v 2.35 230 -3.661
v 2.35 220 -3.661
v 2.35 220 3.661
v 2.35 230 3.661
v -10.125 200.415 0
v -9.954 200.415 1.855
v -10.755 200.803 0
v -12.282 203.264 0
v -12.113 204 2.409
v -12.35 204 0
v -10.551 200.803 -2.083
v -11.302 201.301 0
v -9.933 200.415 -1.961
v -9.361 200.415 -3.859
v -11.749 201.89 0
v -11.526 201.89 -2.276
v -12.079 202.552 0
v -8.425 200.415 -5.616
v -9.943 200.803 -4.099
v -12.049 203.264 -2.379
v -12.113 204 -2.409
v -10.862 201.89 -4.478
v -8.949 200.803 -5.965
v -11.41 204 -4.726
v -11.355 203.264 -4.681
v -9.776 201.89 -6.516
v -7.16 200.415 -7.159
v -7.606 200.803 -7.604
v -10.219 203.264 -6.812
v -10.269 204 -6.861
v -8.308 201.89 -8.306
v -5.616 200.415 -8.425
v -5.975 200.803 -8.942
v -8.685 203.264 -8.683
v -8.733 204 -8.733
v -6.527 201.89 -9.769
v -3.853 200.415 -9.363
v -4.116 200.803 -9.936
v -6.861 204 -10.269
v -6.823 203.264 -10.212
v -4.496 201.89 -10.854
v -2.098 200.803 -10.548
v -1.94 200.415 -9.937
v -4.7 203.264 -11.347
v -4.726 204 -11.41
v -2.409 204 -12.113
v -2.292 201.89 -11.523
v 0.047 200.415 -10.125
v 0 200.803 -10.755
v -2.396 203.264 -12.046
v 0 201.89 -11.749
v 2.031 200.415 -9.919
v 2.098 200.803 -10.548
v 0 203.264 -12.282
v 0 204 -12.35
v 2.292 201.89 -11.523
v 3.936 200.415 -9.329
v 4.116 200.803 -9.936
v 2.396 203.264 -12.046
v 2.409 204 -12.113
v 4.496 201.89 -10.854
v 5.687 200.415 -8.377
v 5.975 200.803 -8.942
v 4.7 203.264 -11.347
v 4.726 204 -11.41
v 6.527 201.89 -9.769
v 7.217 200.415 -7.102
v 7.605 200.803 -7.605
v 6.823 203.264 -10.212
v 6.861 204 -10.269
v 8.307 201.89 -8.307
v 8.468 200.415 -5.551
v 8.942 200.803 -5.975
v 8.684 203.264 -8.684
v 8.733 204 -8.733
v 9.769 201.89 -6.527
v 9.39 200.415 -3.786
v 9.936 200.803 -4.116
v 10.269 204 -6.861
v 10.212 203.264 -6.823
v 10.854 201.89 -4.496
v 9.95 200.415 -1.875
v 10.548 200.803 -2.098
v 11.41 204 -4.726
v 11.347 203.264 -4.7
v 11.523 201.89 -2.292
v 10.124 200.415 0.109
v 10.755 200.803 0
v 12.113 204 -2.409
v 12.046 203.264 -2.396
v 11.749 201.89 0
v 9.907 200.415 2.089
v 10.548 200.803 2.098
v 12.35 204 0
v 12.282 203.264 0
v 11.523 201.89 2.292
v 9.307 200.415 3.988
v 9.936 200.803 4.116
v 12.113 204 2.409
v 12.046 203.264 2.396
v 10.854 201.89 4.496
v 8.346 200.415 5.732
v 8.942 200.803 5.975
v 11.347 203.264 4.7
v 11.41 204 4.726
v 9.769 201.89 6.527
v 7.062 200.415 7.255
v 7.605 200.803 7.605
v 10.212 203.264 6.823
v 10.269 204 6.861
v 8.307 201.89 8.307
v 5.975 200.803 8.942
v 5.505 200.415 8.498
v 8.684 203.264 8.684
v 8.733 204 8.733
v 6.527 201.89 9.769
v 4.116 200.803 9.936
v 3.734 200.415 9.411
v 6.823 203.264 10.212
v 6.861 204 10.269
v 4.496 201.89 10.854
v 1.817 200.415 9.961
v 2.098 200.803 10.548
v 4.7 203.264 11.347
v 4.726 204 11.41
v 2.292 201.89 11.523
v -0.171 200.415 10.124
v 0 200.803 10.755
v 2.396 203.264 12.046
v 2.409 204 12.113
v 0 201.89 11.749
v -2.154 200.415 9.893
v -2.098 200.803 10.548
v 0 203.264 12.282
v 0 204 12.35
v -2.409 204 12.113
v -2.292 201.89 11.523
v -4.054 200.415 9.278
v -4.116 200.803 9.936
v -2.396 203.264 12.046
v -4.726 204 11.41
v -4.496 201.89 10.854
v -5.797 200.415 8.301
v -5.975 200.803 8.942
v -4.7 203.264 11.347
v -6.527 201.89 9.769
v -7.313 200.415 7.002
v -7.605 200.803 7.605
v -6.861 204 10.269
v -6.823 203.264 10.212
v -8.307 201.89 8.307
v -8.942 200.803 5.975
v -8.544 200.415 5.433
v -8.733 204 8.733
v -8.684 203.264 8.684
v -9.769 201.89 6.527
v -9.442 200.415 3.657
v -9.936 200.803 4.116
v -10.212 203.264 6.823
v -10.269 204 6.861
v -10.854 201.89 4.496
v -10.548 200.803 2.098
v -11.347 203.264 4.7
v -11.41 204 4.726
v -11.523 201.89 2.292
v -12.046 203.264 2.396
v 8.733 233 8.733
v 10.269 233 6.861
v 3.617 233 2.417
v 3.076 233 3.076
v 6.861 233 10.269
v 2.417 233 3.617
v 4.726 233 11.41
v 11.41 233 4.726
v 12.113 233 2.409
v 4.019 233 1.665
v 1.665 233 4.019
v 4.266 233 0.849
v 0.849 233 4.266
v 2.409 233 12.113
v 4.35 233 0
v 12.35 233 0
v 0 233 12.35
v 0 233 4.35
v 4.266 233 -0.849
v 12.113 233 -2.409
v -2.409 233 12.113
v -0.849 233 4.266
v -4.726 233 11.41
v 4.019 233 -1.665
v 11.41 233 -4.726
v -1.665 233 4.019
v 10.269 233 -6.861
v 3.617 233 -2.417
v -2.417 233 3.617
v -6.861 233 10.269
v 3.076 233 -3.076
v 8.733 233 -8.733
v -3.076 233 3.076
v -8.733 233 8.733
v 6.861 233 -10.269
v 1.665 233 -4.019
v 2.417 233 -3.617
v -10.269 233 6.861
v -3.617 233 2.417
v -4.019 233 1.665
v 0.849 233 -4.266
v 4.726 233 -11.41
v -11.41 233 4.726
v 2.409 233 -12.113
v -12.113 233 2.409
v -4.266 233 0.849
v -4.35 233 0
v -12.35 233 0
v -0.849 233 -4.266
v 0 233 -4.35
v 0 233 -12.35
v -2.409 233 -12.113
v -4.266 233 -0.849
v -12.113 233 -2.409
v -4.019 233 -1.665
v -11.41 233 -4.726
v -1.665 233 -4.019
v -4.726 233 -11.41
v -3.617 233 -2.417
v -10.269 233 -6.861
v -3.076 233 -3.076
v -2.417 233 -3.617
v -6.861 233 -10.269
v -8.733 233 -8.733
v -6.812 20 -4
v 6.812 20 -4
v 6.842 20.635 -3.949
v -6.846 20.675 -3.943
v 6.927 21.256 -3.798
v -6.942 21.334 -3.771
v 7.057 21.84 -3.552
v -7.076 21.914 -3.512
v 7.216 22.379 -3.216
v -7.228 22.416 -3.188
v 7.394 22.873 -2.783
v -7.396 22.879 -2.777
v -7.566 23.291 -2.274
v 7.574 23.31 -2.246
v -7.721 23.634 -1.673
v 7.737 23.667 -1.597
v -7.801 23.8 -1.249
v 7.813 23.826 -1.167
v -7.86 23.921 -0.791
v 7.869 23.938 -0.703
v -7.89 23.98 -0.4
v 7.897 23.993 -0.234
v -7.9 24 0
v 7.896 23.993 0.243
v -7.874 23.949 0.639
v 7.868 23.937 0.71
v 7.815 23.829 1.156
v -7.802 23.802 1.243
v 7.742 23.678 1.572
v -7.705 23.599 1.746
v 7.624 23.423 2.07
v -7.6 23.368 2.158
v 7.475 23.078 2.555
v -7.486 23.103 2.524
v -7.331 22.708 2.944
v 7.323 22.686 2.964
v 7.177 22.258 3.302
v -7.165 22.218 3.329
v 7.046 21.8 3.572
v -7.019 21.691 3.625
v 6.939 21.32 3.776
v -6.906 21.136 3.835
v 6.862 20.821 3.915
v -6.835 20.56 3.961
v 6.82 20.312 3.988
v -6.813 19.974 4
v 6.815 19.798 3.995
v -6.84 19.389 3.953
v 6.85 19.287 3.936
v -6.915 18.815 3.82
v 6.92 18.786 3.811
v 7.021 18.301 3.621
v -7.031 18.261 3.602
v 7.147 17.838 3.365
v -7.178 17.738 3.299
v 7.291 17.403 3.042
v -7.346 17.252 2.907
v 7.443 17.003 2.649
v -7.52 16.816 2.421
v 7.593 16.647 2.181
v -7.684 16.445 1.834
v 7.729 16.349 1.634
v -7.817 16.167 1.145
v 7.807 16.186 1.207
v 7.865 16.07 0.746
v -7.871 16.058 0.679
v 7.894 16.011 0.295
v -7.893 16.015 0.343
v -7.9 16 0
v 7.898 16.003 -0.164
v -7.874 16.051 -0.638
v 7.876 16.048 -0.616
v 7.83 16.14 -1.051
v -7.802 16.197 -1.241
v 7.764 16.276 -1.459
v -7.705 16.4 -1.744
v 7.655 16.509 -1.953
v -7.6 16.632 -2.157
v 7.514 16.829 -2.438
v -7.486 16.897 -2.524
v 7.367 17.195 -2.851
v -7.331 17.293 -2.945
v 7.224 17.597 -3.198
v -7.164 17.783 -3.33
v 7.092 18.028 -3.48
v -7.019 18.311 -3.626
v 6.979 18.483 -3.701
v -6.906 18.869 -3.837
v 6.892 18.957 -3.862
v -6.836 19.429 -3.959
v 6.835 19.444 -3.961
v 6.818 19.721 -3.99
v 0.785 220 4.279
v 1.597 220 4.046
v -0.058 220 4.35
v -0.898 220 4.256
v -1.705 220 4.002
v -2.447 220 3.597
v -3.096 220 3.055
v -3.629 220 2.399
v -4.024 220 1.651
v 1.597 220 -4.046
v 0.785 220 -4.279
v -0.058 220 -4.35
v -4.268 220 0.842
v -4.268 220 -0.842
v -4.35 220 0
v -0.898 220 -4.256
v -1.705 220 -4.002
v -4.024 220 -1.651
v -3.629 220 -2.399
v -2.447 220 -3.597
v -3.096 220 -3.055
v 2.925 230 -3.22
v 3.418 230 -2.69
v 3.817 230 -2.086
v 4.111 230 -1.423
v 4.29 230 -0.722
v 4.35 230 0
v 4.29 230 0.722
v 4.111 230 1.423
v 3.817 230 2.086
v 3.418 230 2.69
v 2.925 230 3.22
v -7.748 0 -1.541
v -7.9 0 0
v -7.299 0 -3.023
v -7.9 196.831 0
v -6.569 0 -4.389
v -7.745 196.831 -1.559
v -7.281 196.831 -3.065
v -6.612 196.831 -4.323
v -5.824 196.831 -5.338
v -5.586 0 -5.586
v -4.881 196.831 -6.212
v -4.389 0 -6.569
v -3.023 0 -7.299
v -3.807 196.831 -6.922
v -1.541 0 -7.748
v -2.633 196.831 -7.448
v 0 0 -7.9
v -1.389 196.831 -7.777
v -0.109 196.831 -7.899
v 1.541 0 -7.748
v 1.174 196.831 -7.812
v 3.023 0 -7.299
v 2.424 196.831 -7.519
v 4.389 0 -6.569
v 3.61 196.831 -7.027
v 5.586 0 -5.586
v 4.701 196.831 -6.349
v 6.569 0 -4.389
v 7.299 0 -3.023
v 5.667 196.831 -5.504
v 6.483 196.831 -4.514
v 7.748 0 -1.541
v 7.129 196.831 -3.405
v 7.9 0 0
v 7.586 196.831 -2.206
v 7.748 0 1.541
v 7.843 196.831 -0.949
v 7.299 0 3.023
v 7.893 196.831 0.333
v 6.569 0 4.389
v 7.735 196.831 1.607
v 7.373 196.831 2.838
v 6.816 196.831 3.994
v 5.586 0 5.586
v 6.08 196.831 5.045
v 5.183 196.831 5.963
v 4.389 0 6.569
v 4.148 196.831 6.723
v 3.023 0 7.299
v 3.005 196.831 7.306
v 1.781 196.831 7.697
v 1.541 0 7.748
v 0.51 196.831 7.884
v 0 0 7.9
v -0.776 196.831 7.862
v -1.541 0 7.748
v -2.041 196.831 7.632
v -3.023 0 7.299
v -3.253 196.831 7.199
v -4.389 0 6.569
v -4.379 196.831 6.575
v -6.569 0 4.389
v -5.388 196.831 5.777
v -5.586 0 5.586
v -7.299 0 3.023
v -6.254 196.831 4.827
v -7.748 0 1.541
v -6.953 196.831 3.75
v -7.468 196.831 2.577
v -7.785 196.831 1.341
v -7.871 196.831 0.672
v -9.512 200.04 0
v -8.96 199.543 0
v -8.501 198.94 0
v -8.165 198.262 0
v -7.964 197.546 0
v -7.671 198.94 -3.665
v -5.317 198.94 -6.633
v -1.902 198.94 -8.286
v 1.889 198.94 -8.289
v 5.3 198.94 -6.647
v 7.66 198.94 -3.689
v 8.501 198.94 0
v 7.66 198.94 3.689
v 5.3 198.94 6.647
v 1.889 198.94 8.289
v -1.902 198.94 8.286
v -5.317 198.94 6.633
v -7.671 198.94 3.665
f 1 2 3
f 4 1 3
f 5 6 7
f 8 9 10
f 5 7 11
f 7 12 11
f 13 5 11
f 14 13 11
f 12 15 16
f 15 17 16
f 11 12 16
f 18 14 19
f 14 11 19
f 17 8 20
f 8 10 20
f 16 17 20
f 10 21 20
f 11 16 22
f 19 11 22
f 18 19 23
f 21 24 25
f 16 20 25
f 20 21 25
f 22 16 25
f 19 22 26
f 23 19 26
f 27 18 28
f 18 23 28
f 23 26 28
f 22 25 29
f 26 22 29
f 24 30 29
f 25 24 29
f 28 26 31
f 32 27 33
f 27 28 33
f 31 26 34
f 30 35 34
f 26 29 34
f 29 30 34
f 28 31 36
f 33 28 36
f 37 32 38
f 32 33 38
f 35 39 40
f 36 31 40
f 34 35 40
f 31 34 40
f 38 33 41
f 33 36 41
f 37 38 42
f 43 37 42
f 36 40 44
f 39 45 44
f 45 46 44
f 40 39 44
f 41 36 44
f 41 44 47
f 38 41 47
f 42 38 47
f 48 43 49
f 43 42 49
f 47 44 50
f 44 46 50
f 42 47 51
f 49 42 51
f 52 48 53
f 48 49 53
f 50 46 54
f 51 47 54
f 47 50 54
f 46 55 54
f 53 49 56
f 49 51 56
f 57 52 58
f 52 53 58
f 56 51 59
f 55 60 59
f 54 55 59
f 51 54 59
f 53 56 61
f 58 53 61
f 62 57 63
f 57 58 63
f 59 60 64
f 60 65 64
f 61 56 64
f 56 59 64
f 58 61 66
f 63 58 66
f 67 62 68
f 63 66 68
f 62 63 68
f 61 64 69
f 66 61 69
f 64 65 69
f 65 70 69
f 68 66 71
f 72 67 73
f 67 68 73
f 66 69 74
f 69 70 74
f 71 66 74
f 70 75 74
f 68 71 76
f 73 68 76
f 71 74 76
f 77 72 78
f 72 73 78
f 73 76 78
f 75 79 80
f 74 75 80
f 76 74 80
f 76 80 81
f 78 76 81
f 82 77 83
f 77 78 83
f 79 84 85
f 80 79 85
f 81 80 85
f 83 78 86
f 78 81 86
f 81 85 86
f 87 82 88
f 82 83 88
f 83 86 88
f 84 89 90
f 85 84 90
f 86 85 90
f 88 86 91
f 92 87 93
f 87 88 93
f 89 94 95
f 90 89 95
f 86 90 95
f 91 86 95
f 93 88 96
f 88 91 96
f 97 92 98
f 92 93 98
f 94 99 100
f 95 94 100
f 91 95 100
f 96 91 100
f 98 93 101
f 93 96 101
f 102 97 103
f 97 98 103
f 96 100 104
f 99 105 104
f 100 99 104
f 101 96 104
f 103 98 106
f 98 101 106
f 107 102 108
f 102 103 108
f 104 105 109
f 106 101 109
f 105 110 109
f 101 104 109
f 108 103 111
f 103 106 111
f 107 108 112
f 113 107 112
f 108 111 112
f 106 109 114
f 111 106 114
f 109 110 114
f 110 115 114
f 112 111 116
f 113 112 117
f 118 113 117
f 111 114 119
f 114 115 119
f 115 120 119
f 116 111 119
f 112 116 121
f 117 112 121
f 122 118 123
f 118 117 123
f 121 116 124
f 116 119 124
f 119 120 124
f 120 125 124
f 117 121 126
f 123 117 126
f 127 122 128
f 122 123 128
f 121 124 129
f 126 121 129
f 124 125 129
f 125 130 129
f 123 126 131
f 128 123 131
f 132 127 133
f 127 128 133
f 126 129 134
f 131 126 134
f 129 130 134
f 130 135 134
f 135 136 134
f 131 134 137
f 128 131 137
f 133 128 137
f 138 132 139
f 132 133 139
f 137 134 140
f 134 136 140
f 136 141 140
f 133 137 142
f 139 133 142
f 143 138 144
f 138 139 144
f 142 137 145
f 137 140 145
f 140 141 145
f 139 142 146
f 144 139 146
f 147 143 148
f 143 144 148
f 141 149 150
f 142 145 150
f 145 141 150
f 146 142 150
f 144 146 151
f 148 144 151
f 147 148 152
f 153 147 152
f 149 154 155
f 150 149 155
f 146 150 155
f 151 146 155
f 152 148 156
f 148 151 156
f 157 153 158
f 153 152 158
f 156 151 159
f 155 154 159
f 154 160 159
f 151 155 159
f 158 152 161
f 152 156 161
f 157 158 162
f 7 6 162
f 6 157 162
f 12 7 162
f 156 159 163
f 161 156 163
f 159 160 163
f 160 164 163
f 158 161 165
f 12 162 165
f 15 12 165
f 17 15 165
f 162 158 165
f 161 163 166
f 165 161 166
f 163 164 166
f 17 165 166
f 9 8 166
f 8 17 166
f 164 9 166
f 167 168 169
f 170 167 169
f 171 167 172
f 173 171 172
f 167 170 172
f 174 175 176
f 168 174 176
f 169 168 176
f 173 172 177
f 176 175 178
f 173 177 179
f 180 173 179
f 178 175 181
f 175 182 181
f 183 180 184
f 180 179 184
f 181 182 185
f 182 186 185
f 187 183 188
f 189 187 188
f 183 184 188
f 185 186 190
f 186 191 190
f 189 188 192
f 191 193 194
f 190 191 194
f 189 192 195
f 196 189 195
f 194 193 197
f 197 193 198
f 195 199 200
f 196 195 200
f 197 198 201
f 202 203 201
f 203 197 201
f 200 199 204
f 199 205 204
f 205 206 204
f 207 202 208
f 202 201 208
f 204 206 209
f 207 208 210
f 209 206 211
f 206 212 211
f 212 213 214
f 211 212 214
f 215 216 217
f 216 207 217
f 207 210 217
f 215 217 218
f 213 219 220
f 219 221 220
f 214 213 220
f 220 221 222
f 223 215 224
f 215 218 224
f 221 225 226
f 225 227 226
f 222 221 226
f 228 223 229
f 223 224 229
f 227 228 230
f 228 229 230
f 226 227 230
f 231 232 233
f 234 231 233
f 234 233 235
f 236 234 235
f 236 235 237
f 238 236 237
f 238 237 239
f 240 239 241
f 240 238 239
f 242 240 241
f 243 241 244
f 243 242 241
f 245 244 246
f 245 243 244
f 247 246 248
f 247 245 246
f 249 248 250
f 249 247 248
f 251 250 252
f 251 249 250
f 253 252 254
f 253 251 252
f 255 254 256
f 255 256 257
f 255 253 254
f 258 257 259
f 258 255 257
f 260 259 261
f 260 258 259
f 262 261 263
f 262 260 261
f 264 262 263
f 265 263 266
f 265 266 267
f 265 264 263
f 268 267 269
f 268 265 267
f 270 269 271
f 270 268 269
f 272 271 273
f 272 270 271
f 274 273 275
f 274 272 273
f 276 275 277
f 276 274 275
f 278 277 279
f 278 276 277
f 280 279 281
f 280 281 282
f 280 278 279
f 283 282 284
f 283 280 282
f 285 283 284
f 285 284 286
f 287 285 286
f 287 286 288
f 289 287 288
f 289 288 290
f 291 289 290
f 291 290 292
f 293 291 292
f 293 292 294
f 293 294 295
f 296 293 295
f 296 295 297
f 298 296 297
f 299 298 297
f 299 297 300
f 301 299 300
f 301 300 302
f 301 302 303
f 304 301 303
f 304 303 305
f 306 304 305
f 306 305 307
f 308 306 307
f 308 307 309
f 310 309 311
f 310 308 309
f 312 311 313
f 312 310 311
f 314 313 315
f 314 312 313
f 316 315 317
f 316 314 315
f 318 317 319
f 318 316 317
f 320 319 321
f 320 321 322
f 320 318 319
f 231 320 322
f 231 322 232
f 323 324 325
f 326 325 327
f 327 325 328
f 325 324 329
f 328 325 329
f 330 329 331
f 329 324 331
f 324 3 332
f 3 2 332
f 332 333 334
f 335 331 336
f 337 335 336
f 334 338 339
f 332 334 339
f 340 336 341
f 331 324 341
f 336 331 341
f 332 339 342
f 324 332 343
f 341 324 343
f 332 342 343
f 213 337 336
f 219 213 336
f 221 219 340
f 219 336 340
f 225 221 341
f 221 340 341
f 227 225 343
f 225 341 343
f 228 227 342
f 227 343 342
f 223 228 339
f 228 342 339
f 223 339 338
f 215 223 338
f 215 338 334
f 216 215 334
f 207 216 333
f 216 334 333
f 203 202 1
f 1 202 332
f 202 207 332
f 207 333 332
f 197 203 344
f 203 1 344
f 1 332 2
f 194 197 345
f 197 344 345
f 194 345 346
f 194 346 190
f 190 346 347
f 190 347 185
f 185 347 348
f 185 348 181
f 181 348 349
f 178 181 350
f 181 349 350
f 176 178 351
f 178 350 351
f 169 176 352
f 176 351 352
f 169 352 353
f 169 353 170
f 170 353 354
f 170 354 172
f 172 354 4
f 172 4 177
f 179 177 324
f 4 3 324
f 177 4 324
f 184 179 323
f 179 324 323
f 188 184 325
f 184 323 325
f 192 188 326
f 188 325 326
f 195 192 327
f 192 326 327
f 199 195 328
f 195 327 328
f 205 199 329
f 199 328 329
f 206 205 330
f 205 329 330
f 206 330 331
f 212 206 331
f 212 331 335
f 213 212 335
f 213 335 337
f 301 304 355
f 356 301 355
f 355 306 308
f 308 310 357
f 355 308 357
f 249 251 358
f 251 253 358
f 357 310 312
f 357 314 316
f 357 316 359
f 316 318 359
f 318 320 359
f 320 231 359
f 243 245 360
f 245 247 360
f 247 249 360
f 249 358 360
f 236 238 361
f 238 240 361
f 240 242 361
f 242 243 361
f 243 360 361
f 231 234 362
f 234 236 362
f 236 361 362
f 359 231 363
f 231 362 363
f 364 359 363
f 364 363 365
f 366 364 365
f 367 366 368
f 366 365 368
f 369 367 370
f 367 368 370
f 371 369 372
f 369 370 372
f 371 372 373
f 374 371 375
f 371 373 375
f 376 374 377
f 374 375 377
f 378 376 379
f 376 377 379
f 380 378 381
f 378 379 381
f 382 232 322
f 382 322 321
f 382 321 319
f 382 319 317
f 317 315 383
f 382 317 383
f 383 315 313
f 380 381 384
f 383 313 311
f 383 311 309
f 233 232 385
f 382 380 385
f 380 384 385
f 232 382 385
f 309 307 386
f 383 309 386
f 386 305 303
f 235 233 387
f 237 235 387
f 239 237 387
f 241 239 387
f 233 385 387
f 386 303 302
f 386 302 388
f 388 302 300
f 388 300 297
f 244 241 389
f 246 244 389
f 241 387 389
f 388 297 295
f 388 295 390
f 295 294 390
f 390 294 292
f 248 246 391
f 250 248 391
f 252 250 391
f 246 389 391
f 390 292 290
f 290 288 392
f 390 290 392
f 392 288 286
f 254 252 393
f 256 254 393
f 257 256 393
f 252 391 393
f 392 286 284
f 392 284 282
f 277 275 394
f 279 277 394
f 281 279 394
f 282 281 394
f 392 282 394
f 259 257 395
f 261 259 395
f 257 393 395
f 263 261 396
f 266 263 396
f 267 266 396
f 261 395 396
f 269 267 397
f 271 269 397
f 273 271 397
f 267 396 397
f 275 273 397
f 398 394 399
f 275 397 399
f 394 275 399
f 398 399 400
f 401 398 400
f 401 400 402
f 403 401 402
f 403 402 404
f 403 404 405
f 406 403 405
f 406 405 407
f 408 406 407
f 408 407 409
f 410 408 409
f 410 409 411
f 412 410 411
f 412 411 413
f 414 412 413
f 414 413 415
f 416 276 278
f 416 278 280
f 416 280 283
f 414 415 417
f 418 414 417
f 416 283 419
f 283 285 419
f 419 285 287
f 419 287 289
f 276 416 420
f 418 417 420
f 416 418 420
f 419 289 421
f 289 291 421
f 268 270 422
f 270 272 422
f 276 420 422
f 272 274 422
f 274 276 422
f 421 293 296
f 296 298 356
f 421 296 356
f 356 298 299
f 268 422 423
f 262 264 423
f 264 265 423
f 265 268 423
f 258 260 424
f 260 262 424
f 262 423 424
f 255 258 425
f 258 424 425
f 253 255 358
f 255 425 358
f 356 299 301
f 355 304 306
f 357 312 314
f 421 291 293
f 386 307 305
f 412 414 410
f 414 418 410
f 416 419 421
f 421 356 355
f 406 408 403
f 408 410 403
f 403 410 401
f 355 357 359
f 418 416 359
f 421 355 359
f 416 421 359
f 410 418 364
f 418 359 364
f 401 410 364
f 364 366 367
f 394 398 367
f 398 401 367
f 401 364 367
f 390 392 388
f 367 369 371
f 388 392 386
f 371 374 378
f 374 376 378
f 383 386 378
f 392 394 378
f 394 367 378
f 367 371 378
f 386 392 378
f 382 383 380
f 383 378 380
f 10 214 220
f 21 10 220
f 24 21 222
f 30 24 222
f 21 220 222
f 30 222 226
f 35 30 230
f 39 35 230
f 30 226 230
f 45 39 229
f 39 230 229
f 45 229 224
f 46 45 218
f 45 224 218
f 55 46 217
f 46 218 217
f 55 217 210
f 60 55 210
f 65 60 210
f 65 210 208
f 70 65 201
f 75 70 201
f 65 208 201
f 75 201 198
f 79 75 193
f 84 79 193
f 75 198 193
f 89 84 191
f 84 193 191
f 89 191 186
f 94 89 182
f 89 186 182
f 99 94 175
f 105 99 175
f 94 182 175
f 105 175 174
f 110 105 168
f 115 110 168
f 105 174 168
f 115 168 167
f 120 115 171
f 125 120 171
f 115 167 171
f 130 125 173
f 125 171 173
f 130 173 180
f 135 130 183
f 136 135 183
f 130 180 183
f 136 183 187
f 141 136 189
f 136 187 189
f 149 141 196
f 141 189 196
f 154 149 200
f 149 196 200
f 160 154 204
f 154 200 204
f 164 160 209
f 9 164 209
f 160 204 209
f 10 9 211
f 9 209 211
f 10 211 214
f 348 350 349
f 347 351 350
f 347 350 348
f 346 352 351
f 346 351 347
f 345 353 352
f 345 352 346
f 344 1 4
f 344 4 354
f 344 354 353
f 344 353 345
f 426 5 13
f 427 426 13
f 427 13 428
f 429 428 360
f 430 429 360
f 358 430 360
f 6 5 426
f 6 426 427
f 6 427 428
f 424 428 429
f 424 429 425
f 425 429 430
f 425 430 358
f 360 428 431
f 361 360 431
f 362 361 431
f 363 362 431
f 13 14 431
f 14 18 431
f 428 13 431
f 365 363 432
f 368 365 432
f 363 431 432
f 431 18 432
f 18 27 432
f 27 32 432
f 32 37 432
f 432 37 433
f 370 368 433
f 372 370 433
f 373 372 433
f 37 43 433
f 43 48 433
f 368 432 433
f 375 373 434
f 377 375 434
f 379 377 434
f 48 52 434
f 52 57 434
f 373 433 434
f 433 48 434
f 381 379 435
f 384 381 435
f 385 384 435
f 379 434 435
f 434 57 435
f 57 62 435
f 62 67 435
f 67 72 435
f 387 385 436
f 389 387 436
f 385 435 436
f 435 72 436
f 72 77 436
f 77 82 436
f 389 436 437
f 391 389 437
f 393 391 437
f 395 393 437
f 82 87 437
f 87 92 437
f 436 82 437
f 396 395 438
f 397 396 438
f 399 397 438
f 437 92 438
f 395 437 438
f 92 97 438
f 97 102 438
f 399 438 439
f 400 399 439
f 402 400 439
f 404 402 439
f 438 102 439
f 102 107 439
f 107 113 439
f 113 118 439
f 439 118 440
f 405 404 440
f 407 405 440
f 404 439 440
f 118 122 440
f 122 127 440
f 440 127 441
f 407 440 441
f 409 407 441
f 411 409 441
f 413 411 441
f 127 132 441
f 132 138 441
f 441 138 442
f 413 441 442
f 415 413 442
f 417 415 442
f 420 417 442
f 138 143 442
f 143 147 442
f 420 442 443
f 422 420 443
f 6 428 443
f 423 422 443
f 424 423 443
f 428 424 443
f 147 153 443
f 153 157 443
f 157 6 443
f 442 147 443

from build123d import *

# Parameters (mm, degrees)
BOSS_EXTRUDE1_DEPTH     = 10
CUT_EXTRUDE1_DEPTH      = 234.65368604
CUT_EXTRUDE1_DEPTH_BACK = 234.65368604
SKETCH3_R               = 4
FILLET1_R               = 4
FILLET2_R               = 4


with BuildPart() as part:
    # Sketch1 → Revolve1 (revolve)
    with BuildSketch(Plane.XY):
        Polygon((0, 0), (-7.9, 0), (-7.9, 200), (-12.35, 200), (-12.35, 233), (-4.35, 233), (-4.35, 220), (0, 220), align=None)
    revolve(axis=Axis((0, 220, 0), (0, -1, 0)))

    # Sketch2 → Boss-Extrude1 (add)
    with BuildSketch(Plane(origin=(0, 220, 0), x_dir=(1, 0, 0), z_dir=(0, 1, 0))):
        with BuildLine():
            ThreePointArc((4.35, 0), (3.817394399, 2.085665361), (2.35, 3.660601044))
            Line((2.35, 3.660601044), (2.35, -3.660601044))
            ThreePointArc((2.35, -3.660601044), (3.817394399, -2.085665361), (4.35, 0))
        make_face()
    extrude(amount=BOSS_EXTRUDE1_DEPTH)

    # Sketch3 → Cut-Extrude1 (cut, two sides: drawn at the far end of the back side and taken through both)
    with BuildSketch(Plane(origin=(0, 0, 0), x_dir=(0, 0, -1), z_dir=(1, 0, 0)).offset(-CUT_EXTRUDE1_DEPTH_BACK)):
        with Locations((0, 20)):
            Circle(SKETCH3_R)
    extrude(amount=CUT_EXTRUDE1_DEPTH + CUT_EXTRUDE1_DEPTH_BACK, mode=Mode.SUBTRACT)

    # Fillet1
    fillet1_edges = [part.edges().sort_by_distance(p)[0] for p in [
        (12.35, 200, 0),
    ]]
    fillet(fillet1_edges, radius=FILLET1_R)

    # Fillet2
    fillet2_edges = [part.edges().sort_by_distance(p)[0] for p in [
        (7.9, 200, 0),
    ]]
    fillet(fillet2_edges, radius=FILLET2_R)


solid = part.part
